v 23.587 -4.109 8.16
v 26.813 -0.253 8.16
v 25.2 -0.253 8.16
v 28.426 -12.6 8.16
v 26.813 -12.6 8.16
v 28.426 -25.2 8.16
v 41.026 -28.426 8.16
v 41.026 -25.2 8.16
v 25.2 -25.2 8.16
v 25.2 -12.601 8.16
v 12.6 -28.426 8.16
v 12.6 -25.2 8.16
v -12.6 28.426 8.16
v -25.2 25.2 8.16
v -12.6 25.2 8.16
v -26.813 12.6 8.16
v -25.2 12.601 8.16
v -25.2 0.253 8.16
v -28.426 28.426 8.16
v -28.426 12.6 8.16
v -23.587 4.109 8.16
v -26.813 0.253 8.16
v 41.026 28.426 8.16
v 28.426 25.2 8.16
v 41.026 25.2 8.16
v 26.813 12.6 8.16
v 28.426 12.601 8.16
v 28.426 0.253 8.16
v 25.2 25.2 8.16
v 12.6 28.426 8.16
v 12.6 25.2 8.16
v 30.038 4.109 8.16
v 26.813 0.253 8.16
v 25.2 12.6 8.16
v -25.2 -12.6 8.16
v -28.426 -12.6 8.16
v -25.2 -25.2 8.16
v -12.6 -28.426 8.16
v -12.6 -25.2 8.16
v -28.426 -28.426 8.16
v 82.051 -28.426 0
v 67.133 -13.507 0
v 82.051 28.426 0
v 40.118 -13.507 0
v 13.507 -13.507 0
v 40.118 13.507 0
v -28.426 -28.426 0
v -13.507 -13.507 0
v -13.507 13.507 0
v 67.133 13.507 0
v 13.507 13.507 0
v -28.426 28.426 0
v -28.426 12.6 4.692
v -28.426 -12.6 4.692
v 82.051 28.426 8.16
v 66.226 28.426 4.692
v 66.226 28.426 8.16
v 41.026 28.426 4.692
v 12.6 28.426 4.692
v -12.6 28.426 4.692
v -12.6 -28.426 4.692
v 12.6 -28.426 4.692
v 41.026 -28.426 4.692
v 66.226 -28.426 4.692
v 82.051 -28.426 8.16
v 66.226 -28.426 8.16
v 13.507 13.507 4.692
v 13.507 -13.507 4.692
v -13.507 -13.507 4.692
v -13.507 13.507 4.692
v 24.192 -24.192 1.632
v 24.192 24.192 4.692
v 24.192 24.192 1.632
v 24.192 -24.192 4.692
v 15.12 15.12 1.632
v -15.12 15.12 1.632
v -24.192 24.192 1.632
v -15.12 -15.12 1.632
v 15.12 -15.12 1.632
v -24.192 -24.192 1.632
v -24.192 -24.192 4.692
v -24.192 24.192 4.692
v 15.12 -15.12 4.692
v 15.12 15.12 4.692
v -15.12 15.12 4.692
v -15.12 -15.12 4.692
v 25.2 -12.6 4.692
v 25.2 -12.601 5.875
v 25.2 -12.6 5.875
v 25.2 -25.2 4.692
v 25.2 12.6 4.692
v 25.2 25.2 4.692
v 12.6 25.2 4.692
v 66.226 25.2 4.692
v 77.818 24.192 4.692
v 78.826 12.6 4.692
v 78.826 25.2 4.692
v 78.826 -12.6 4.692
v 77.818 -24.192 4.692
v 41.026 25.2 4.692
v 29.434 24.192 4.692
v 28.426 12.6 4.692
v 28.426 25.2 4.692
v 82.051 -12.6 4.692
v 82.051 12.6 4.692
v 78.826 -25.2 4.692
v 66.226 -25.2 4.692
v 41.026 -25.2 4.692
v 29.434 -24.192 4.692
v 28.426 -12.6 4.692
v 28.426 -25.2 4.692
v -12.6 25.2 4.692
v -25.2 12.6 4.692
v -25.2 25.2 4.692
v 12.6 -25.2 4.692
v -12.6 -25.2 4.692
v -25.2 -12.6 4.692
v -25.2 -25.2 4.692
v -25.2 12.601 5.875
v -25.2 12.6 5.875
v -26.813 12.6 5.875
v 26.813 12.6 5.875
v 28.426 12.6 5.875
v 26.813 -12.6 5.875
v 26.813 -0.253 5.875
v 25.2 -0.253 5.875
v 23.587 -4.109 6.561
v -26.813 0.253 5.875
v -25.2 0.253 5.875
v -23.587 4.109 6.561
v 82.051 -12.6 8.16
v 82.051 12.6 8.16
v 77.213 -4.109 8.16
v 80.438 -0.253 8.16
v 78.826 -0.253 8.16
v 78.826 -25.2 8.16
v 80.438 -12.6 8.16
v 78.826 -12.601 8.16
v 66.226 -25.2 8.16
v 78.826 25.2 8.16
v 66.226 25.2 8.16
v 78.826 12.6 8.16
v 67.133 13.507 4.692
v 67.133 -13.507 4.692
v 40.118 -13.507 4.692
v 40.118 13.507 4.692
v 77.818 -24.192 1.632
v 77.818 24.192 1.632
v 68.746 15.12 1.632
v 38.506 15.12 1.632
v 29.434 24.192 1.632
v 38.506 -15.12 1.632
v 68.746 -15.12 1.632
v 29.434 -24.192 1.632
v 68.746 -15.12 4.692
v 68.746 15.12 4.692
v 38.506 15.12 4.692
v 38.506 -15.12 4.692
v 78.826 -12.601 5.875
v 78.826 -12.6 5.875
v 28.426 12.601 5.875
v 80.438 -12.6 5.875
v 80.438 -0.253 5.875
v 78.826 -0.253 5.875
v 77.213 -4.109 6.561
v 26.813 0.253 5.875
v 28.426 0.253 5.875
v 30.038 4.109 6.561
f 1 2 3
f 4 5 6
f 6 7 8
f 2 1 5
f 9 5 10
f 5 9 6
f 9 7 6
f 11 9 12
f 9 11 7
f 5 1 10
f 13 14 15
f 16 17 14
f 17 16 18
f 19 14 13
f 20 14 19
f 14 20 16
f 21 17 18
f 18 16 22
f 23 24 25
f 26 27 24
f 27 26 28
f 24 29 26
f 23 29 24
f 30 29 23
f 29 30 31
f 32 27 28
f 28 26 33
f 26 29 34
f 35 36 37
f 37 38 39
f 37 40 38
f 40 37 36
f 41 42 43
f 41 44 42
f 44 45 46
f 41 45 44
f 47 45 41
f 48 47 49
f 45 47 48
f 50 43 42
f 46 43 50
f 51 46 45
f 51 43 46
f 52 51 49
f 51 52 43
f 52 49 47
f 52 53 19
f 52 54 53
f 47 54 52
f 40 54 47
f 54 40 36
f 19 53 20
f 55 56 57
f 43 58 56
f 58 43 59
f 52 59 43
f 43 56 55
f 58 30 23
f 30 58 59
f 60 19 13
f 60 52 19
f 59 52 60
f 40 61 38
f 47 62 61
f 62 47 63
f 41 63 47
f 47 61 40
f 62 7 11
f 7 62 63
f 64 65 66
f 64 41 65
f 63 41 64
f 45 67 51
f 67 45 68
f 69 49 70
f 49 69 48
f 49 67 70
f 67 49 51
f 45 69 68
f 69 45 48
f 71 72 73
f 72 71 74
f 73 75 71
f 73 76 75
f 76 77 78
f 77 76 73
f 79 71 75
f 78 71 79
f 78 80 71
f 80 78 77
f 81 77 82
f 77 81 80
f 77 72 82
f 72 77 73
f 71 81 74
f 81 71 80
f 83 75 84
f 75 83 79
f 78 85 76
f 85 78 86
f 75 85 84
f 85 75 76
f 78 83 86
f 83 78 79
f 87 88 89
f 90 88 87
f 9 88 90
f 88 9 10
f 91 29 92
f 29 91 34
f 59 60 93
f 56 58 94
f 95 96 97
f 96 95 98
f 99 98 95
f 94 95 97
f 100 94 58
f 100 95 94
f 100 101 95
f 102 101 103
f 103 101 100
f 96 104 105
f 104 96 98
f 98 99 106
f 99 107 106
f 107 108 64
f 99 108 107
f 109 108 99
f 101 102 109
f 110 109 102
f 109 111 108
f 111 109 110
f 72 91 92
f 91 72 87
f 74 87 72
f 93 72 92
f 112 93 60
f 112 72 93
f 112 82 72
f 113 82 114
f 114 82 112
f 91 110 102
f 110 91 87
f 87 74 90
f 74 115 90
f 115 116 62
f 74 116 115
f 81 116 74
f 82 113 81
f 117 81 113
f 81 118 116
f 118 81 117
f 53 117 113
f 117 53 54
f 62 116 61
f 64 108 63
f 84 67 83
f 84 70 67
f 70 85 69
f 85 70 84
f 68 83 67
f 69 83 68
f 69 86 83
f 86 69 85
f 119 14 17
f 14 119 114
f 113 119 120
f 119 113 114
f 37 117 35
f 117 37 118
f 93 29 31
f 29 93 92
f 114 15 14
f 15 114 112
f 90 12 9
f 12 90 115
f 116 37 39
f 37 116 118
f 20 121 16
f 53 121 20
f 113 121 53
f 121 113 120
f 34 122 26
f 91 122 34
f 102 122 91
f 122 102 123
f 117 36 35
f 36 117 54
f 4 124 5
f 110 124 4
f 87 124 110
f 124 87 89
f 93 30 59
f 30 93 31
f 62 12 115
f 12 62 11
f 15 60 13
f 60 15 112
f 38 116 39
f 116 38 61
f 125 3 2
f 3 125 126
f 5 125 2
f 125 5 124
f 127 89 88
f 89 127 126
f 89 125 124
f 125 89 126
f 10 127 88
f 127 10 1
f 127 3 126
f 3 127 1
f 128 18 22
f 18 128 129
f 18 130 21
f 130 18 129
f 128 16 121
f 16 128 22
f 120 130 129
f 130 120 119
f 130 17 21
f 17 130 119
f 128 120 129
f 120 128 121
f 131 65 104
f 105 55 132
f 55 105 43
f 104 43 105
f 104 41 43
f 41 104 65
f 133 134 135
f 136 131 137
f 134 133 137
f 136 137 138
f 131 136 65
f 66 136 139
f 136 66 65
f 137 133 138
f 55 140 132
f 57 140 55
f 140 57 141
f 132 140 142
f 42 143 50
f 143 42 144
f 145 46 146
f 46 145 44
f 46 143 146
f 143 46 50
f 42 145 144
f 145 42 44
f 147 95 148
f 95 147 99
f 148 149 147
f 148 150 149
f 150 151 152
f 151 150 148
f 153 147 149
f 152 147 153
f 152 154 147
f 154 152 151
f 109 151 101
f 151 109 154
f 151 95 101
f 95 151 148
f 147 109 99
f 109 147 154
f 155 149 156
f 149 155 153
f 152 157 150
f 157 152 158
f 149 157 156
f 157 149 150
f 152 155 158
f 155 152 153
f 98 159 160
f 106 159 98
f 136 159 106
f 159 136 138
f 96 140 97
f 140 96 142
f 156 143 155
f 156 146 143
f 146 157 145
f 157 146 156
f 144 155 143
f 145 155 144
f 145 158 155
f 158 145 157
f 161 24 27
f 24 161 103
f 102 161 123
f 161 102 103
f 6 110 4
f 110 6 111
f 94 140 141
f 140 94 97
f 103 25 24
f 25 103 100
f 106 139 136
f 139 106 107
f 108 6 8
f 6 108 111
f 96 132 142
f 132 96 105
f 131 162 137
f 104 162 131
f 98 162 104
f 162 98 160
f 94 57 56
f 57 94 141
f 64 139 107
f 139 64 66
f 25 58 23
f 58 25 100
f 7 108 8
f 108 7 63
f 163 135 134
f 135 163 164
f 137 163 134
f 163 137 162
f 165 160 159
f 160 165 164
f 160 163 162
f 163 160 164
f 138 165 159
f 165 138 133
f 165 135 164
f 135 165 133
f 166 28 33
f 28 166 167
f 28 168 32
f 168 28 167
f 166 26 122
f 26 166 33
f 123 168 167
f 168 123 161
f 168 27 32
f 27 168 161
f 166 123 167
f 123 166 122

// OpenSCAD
/*
 * Square PGA CPU Storage Tray
 *
 * Copyright (c) 2022-2025 Alexei A. Smekalkine <ikle@ikle.ru>
 *
 * SPDX-License-Identifier: BSD-2-Clause
 */

$fn = 32;

module c_box (dx, dy, dz, z = 0)
{
	translate ([-dx/2, -dy/2, z]) cube ([dx, dy, dz]);
}

module c_donut (dx, dy, hx, hy, dz, z = 0)
{
	difference () {
		c_box (dx, dy, dz, z);
		c_box (hx, hy, dz + 2, z - 1);
	}
}

module s_box   (w,       h, z = 0)  { c_box   (w, w,             h, z); }
module s_donut (w, hole, h, z = 0)  { c_donut (w, w, hole, hole, h, z); }

module fixer (fw = 1.6, fh = 1.6, fl = 10, lip = 1.6, k = 0.7)
{
	ll = k * fl; fhl = k * fh;

	hull () {
		cube ([fw, fl, fh]);
		rotate (asin (lip/ll))
			translate ([0, 0, fh - fhl]) cube ([fw, ll, fhl]);
	}
}

module s_fixer (w, h, t)
{
	fh = 1.4 * t;
	translate ([w/2, -w/4 - 0.001, h - fh]) fixer (t, fh, 0.245 * w);
}

/*
 * w  -- package width
 * pw -- pin grid width
 * hw -- pin hole width
 * pt -- package thickness
 * pl -- pin length
 * t  -- base thickness
 * wt -- wall thickness
 */
module s_cell (w = 50, pw = 48, hw = 30, pt = 3.4, pl = 3, t = 1.6, wt = 3.2)
{
	union () {
		difference () {
			s_donut (w + 2*wt, hw - 2*t, t + pl + pt, 0);
			s_box (w, pt + 1, t + pl);                 // package
			s_donut (pw, hw, pl + 1, t);               // pin grid
			c_box (w + 2*wt + 1, w/2, pt + 1, t + pl); // fixer hole
			c_box (w/2, w + 2*wt + 1, pt + 1, t + pl); // thumb hole
		}
		s_fixer (w, t + pl + pt, t);			// right fixer
		rotate (180) s_fixer (w, t + pl + pt, t);	// left fixer
	}
}

module s_tray (nx, ny, w, pw, hw, pt, pl, t, wt)
{
	s = w + wt;

	union ()
		for (i = [0:nx-1], j = [0:ny-1])
			translate ([s*i, s*j, 0])
				s_cell (w, pw, hw, pt, pl, t, wt);
}

/*
 * CPU Tray for Socket 5, Socket 7, Socket 370, Socket A
 */
module s_tray_s5 (nx = 2, ny = 2, t = 1.6, wt = 3.2)
{
	s_tray (nx, ny, 50, 48, 30, 3.4, 3, t, wt);
}

scale ([1.008, 1.008, 1.02]) s_tray_s5 (2, 1);
